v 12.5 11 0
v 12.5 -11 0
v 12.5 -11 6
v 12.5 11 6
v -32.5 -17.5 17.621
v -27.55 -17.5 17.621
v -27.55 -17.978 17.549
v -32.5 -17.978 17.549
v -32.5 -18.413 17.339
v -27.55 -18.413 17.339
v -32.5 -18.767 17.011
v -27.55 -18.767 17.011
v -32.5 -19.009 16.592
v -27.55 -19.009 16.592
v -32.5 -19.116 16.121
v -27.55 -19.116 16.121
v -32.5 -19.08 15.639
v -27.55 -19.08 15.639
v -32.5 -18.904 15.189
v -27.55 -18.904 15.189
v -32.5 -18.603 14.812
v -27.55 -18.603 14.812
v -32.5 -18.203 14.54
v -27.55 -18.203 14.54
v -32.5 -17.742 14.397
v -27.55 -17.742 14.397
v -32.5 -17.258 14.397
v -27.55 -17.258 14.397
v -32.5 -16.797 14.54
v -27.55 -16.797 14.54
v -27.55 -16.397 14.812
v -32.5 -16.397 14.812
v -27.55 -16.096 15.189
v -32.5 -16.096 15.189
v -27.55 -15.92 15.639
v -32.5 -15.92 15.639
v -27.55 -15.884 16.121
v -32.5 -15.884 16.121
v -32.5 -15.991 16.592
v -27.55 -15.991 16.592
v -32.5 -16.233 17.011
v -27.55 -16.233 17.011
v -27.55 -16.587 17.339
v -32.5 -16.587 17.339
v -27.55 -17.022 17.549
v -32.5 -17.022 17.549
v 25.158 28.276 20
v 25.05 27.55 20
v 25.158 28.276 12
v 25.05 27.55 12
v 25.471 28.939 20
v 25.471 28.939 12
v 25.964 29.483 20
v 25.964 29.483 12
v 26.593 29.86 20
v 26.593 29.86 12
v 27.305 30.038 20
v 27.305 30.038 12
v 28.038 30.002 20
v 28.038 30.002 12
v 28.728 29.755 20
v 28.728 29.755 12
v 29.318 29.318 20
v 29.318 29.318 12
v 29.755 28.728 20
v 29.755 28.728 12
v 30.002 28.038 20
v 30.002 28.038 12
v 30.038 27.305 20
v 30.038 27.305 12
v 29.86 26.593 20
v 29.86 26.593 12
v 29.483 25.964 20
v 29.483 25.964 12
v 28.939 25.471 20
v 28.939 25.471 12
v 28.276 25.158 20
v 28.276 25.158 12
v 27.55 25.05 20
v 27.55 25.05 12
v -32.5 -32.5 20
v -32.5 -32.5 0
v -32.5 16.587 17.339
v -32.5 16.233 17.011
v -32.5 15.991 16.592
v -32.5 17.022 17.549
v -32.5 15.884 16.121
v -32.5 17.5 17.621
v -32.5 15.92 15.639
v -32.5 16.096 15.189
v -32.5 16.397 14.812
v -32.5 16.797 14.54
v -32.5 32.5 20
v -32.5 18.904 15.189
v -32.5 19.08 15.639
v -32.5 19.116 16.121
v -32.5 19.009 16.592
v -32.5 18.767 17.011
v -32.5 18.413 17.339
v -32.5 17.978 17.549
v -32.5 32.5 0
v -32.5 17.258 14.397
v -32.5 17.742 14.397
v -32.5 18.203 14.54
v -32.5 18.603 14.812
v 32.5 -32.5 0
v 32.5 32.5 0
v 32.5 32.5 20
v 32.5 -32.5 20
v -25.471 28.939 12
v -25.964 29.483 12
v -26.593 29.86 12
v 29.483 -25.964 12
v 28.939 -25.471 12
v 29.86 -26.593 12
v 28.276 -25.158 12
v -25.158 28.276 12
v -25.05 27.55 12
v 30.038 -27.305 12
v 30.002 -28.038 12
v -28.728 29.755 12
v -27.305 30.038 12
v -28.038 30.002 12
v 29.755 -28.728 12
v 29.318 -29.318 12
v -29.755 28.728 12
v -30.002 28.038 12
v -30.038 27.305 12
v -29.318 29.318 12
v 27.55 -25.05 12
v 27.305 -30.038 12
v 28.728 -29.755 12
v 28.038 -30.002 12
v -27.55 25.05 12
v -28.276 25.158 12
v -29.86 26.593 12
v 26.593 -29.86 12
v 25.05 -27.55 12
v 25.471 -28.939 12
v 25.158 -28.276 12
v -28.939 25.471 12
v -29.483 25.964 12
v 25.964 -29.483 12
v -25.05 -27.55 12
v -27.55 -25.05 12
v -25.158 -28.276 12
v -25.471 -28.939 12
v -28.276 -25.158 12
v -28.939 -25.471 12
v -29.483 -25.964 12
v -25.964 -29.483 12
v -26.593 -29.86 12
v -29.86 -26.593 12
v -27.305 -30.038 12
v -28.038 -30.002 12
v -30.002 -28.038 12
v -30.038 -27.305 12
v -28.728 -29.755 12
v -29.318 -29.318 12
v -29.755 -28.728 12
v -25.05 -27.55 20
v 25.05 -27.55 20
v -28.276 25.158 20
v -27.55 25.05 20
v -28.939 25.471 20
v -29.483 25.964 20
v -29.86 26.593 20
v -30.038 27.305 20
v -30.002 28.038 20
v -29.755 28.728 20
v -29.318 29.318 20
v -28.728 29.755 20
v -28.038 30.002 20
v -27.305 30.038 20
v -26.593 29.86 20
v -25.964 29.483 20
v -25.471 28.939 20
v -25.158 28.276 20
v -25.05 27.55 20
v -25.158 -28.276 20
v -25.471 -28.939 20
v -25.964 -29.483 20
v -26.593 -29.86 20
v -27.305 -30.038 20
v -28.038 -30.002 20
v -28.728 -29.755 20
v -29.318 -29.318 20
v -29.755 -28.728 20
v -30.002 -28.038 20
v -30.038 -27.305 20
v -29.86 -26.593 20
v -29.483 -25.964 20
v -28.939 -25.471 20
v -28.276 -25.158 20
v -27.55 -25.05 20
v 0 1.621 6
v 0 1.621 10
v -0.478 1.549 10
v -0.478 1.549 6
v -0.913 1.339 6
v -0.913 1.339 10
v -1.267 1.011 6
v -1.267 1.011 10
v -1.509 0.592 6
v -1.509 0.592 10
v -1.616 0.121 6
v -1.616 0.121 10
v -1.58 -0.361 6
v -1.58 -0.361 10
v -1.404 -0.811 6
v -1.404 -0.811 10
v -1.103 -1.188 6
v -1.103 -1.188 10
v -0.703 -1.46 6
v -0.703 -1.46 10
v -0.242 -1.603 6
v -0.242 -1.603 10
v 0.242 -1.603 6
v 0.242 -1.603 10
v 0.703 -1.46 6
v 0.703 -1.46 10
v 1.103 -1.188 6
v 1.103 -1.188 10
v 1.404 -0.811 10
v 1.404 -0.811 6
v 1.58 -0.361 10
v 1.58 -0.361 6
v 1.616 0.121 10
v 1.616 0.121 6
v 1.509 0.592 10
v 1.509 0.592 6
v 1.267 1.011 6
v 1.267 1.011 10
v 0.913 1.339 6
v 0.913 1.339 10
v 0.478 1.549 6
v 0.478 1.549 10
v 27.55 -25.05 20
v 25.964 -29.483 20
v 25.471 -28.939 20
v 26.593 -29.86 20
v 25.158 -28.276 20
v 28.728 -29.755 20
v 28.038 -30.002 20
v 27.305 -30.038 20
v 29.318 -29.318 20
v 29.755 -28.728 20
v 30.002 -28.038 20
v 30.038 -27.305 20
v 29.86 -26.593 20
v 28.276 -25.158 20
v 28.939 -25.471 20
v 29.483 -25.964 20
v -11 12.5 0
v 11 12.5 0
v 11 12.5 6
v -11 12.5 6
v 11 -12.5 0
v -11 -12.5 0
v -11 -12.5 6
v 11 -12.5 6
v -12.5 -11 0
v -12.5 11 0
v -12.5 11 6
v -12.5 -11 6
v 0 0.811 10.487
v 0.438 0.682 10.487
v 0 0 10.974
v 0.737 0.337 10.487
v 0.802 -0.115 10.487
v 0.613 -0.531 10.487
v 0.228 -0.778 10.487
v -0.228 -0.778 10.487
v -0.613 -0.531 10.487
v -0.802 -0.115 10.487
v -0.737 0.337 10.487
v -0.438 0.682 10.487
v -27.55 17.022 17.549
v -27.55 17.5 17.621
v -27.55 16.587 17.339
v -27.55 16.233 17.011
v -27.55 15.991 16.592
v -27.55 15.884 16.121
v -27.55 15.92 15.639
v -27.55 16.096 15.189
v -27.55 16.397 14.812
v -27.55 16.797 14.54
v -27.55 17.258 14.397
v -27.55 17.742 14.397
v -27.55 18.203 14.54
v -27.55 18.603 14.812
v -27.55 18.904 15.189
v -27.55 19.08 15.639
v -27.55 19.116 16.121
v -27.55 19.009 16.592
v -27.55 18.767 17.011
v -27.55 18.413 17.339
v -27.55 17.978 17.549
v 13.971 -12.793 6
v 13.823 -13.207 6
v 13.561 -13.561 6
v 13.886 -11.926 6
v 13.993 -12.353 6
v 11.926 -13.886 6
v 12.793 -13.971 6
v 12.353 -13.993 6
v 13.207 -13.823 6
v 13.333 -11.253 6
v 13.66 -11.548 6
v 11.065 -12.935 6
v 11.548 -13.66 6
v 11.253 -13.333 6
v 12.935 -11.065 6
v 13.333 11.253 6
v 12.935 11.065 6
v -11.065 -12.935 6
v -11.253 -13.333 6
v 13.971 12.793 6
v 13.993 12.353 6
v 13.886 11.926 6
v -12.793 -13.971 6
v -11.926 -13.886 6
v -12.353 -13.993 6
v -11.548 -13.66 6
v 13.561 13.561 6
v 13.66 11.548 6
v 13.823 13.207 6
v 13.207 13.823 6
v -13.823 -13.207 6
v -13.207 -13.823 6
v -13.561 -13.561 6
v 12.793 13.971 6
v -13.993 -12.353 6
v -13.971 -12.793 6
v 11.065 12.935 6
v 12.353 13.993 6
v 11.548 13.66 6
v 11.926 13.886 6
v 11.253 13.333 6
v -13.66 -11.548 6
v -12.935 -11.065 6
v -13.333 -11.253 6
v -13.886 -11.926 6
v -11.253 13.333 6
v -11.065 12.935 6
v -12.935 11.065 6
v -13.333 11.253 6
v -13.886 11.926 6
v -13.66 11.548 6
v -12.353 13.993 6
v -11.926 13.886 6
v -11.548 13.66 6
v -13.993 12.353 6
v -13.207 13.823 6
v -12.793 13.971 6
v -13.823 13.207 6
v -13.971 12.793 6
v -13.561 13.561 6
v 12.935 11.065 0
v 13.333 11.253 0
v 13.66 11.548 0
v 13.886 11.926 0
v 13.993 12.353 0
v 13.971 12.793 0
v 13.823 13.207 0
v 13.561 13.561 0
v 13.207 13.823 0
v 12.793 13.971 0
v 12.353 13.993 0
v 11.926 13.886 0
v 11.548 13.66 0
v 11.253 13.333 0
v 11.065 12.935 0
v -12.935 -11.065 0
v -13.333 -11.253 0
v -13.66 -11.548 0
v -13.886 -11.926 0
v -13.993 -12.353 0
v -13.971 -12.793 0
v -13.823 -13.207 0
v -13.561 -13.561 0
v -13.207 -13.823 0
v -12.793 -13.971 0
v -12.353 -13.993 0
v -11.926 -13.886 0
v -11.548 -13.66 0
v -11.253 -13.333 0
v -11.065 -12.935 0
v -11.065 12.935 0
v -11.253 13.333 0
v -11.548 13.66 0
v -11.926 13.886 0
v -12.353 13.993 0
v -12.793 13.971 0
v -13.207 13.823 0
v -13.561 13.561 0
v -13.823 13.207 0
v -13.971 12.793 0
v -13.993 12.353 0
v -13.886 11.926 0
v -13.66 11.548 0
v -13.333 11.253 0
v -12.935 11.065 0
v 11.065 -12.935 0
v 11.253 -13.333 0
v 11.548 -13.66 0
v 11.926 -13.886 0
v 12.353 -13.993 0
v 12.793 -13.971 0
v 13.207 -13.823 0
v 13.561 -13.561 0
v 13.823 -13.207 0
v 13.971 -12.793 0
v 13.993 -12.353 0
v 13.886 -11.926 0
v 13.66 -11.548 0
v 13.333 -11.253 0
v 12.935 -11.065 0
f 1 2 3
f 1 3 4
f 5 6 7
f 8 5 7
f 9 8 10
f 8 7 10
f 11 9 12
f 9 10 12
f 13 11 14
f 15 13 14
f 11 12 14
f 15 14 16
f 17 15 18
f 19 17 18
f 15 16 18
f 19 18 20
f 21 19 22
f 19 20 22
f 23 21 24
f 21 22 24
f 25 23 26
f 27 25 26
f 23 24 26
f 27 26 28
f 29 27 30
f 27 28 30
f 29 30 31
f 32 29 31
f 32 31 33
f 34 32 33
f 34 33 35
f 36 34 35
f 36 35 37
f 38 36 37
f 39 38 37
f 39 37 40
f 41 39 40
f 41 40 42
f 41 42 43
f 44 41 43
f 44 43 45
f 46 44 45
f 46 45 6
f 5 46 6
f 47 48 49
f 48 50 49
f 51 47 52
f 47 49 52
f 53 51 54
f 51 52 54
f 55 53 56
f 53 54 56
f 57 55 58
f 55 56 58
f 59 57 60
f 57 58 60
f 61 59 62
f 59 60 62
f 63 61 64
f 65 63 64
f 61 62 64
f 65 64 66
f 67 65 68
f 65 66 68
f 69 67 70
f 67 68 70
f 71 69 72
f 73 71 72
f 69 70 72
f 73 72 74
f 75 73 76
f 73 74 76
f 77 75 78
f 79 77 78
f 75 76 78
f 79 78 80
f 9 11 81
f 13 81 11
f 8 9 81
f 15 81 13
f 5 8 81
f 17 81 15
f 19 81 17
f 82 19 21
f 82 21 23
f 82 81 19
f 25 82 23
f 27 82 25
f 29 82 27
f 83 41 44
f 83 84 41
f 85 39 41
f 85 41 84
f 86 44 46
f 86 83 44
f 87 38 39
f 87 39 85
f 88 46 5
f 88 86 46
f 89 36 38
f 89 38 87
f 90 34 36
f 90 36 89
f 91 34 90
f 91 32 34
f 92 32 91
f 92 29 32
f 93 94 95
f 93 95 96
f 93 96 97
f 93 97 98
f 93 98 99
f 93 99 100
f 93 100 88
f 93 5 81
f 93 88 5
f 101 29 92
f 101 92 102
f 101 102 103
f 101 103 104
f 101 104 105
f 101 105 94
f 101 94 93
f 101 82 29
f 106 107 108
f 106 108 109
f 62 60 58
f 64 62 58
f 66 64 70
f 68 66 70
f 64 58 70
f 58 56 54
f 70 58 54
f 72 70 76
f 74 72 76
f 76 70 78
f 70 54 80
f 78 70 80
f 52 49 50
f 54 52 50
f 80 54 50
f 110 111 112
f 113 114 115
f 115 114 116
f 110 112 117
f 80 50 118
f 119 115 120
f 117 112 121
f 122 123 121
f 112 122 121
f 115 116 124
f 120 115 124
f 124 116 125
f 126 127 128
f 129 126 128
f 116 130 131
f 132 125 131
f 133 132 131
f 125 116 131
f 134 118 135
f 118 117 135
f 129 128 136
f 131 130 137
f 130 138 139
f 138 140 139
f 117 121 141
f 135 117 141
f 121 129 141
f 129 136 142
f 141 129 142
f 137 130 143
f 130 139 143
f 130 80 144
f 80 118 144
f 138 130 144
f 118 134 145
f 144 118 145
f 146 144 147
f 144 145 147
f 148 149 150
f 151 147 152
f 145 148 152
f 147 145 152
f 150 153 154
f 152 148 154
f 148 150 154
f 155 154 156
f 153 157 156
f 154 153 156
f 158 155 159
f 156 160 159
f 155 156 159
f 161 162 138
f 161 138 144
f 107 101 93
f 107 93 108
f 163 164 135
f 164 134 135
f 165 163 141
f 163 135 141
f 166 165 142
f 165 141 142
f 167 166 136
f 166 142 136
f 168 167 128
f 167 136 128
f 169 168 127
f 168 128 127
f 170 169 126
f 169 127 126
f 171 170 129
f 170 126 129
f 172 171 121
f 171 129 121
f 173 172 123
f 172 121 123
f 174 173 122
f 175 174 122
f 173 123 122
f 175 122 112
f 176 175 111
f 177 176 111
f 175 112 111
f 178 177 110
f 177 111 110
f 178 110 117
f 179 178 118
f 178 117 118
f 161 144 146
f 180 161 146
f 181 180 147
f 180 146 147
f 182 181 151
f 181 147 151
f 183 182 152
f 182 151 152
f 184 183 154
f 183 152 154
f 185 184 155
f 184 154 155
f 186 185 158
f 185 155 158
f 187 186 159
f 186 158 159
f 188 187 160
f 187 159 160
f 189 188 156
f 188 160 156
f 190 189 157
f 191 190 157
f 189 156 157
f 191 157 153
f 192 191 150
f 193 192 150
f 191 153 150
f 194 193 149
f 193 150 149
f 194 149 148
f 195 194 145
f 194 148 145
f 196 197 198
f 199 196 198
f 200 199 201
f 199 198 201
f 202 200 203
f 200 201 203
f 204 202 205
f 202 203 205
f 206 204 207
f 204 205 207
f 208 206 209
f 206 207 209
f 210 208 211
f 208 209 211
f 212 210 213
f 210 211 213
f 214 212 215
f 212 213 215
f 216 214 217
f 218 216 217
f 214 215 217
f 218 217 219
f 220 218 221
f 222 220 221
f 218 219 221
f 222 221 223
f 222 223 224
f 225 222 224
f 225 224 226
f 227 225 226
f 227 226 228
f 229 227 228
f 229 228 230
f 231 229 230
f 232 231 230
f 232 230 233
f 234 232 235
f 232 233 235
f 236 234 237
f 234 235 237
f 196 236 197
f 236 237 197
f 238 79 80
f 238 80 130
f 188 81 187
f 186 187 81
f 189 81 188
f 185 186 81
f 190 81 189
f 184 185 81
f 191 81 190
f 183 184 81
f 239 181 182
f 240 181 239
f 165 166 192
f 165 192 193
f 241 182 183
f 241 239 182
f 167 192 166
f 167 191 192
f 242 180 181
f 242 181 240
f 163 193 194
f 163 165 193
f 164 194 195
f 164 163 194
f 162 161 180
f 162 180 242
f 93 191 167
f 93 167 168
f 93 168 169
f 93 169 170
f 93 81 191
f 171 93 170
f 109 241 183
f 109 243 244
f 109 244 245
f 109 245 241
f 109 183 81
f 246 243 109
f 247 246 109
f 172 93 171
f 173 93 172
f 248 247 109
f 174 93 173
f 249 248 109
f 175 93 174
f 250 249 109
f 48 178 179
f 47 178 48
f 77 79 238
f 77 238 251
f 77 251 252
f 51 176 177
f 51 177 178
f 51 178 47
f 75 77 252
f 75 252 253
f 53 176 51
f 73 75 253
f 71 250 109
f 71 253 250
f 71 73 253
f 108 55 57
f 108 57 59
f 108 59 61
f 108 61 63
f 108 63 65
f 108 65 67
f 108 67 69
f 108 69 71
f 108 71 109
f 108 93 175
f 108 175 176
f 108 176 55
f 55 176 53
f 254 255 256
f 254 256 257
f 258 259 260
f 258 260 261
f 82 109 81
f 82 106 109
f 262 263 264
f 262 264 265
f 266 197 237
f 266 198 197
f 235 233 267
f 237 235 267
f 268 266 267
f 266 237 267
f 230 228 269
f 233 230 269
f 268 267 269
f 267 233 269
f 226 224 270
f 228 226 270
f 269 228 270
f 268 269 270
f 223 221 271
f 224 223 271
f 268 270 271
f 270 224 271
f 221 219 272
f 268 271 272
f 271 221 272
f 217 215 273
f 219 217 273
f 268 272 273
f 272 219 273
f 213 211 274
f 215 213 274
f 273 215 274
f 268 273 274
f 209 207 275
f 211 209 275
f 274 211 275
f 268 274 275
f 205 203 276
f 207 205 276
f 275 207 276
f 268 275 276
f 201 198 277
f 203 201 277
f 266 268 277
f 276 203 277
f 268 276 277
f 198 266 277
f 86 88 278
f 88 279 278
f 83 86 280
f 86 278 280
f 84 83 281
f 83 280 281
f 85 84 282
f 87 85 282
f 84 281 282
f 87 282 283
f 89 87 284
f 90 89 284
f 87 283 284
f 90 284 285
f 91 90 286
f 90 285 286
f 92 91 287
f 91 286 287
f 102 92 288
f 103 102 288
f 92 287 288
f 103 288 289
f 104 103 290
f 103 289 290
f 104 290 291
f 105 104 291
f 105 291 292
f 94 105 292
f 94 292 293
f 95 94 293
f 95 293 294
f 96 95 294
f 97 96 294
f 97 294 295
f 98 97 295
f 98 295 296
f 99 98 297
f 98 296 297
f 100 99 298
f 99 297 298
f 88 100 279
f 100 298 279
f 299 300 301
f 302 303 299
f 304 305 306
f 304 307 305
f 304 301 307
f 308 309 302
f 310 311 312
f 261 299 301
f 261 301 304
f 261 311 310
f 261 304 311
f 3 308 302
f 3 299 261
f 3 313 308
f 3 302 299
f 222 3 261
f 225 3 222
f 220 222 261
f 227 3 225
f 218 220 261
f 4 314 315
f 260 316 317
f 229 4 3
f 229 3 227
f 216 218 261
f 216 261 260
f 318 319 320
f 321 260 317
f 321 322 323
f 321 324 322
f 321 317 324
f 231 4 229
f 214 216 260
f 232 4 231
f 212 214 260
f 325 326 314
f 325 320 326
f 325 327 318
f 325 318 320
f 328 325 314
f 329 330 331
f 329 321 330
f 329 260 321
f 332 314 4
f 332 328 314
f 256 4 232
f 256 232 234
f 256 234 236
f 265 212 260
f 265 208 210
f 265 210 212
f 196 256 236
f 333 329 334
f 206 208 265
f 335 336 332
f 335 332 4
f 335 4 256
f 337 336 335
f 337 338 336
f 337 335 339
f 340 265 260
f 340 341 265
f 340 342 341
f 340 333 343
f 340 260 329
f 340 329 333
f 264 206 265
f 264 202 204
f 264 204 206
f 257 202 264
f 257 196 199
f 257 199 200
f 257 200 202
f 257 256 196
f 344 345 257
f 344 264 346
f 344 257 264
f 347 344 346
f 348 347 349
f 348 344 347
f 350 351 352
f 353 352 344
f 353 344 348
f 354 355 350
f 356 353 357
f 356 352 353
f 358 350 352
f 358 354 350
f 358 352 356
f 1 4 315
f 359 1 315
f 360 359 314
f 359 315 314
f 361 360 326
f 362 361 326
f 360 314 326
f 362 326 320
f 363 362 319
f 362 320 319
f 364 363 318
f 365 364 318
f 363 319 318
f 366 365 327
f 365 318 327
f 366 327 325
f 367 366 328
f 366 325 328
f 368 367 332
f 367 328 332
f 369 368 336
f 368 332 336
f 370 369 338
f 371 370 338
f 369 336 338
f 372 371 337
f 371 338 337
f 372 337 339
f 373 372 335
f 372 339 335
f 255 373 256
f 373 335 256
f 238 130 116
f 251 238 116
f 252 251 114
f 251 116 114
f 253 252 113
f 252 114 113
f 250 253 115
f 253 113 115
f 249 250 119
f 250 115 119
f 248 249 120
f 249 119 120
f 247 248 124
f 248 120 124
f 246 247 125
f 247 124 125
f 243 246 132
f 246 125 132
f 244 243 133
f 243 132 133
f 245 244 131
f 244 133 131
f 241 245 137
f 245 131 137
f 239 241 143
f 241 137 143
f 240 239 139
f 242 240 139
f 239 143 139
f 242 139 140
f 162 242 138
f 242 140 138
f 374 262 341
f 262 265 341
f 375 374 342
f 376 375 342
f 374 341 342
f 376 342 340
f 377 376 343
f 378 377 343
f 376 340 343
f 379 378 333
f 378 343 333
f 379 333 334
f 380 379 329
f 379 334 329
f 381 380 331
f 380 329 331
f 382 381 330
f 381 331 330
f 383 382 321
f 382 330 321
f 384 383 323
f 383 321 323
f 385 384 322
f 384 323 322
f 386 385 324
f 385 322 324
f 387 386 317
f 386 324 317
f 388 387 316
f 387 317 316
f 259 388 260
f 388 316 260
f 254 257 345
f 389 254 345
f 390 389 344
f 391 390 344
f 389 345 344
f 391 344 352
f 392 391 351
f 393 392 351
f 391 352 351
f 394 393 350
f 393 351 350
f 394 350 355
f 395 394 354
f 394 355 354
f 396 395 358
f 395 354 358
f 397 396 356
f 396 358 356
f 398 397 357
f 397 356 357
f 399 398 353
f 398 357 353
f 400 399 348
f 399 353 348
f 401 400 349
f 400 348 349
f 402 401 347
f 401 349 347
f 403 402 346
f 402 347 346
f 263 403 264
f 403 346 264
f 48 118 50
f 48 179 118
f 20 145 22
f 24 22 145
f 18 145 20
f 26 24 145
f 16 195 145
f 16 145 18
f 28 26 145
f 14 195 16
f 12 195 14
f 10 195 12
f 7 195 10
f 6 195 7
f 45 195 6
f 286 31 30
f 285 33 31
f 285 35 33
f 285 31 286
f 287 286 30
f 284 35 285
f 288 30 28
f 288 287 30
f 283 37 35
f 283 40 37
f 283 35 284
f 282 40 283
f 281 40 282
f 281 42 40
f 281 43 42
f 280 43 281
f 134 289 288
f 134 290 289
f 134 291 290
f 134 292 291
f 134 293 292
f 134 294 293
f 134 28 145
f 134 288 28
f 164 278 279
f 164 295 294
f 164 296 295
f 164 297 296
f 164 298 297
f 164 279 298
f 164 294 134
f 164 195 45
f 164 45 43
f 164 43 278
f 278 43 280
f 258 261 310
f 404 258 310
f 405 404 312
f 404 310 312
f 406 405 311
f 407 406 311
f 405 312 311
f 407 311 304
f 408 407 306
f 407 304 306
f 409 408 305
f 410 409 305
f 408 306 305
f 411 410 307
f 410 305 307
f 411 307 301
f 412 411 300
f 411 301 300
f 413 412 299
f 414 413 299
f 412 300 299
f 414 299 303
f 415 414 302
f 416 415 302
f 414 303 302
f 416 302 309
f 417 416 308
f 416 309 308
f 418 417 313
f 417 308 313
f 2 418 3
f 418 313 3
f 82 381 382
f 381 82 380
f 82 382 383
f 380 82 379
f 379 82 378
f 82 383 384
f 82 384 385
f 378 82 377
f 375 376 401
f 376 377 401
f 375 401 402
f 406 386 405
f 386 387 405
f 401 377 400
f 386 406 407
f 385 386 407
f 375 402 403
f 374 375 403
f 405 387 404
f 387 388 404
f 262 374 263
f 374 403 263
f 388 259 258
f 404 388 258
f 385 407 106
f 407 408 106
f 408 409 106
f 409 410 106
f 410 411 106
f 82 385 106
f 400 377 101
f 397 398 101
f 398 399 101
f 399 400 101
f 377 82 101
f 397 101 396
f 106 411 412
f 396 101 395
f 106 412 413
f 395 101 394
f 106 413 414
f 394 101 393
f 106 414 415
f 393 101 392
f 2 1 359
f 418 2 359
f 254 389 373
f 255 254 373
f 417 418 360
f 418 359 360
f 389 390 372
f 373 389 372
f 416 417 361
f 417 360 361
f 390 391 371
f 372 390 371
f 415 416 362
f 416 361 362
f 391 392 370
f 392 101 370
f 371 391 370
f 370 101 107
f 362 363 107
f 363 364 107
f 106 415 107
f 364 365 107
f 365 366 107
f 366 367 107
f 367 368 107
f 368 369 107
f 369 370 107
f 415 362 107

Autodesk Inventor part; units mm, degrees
ref_plane "YZ Plane" through (0, 0, 0) normal (1, 0, 0) x (0, 1, 0)
ref_plane "XZ Plane" through (0, 0, 0) normal (0, 1, 0) x (-1, 0, 0)
ref_plane "XY Plane" through (0, 0, 0) normal (0, 0, 1) x (1, 0, 0)
sketch "Sketch1" plane through (0, 0, 0) normal (0, 0, 1) x (1, 0, 0)
  line L0 (0, 45.5) -> (0, -45.5) construction
  line L1 (-45.5, 0) -> (45.5, 0) construction
  line L2 (-32.5, 32.5) -> (32.5, 32.5)
  line L3 (32.5, 32.5) -> (32.5, -32.5)
  line L4 (32.5, -32.5) -> (-32.5, -32.5)
  line L5 (-32.5, -32.5) -> (-32.5, 32.5)
  point P0 (0, 0)
  dimension "d0" = 65
  dimension "d1" = 65
extrude "Extrusion1" add sketch "Sketch1" along normal blind 20
sketch "Sketch4" plane through (0, 0, 20) normal (0, 0, 1) x (1, 0, 0)
  line L0 (-45.5, 0) -> (45.5, 0) construction
  line L1 (0, 45.5) -> (0, -45.5) construction
  line L2 (-27.55, 27.55) -> (27.55, 27.55) construction
  line L3 (27.55, 27.55) -> (27.55, -27.55) construction
  line L4 (27.55, -27.55) -> (-27.55, -27.55) construction
  line L5 (-27.55, -27.55) -> (-27.55, 27.55) construction
  point P0 (0, 0)
  dimension "d15" = 55.1
  dimension "d16" = 55.1
hole "Hole2" at (-27.55, 27.55, 20) at (27.55, 27.55, 20) at (27.55, -27.55, 20) at (-27.55, -27.55, 20) at (-27.55, 27.55, 20) at (27.55, 27.55, 20) direction (0, 0, -1) diameter 5 depth 8
sketch "Sketch5" plane through (0, 0, 20) normal (0, 0, 1) x (1, 0, 0)
  circle A0 centre (-27.55, 27.55) radius 2.5 projected
  circle A1 centre (27.55, -27.55) radius 2.5 projected
  line L0 (-27.55, 27.55) -> (27.55, 27.55)
  line L1 (27.55, 27.55) -> (27.55, -27.55)
  line L2 (27.55, -27.55) -> (-27.55, -27.55)
  line L3 (-27.55, -27.55) -> (-27.55, 27.55)
  point P0 (0, 0)
extrude "Extrusion3" cut sketch "Sketch5" against normal blind 8 contours L0 L1 A1 L2 L3 A0 | A0 L3 L0 | L1 L2 A1 picked at (-25.9042, 27.3646) picked at (27.003, -25.9868)
sketch "Sketch6" plane through (-32.5, -32.5, 0) normal (-1, 0, 0) x (0, 0, 1)
  line L0 (0, 65) -> (20, 65) projected
  line L1 (0, 0) -> (20, 0) projected
  line L2 (20, 7.45) -> (12, 7.45) construction
  line L3 (20, 57.55) -> (20, 7.45) construction
  line L4 (12, 57.55) -> (20, 57.55) construction
  line L5 (12, 7.45) -> (12, 57.55) construction
  line L6 (16, 57.55) -> (16, 7.45) construction
  point P0 (0, 32.5)
  point P1 (16, 50)
  point P2 (16, 15)
  dimension "d26" = 15
  dimension "d27" = 15
hole "Hole3" at (-32.5, 17.5, 16) at (-32.5, -17.5, 16) direction (1, 0, 0) diameter 3.242 end up to surface thread size "M4x0.7" class "6H" standard "ANSI Metric M Profile"
sketch "Sketch8" plane through (0, 0, 0) normal (0, 0, -1) x (-1, 0, 0)
  line L0 (32.5, 32.5) -> (-32.5, 32.5) construction
  line L1 (-32.5, 32.5) -> (-32.5, -32.5) construction
  line L2 (-32.5, -32.5) -> (32.5, -32.5) construction
  line L3 (32.5, -32.5) -> (32.5, 32.5) construction
  line L4 (0, -45.5) -> (0, 45.5) construction
  line L5 (-45.5, 0) -> (45.5, 0) construction
  line L6 (12.5, -12.5) -> (-12.5, -12.5)
  line L7 (-12.5, -12.5) -> (-12.5, 12.5)
  line L8 (-12.5, 12.5) -> (12.5, 12.5)
  line L9 (12.5, 12.5) -> (12.5, -12.5)
  point P0 (0, 0)
  dimension "d44" = 25
  dimension "d45" = 25
extrude "Extrusion4" cut sketch "Sketch8" against normal blind 6
sketch "Sketch9" plane through (0, 0, 0) normal (0, 0, -1) x (-1, 0, 0)
  line L0 (12.5, 12.5) -> (12.5, -12.5) construction
  line L1 (12.5, -12.5) -> (-12.5, -12.5) construction
  line L2 (-12.5, -12.5) -> (-12.5, 12.5) construction
  line L3 (-12.5, 12.5) -> (12.5, 12.5) construction
  line L4 (32.5, 32.5) -> (-32.5, 32.5) construction
  line L5 (-32.5, 32.5) -> (-32.5, -32.5) construction
  line L6 (-32.5, -32.5) -> (32.5, -32.5) construction
  line L7 (32.5, -32.5) -> (32.5, 32.5) construction
  line L8 (12.5, -12.5) -> (-12.5, -12.5) construction
  point P0 (0, 0)
hole "Hole5" at (-12.5, -12.5, 0) at (12.5, -12.5, 0) at (12.5, 12.5, 0) at (-12.5, 12.5, 0) direction (0, 0, 1) diameter 3 depth 6
sketch "Sketch10" plane through (0, 0, 6) normal (0, 0, -1) x (-1, 0, 0)
  point P0 (0, 0)
  point P1 (0, 0)
hole "Hole6" at (0, 0, 6) direction (0, 0, 1) diameter 3.242 depth 4 tip angle 118 thread size "M4x0.7" class "6H" standard "ANSI Metric M Profile"
properties part number "Large-cuvette-mount-50mm-V3" material "PC/ABS Plastic"
